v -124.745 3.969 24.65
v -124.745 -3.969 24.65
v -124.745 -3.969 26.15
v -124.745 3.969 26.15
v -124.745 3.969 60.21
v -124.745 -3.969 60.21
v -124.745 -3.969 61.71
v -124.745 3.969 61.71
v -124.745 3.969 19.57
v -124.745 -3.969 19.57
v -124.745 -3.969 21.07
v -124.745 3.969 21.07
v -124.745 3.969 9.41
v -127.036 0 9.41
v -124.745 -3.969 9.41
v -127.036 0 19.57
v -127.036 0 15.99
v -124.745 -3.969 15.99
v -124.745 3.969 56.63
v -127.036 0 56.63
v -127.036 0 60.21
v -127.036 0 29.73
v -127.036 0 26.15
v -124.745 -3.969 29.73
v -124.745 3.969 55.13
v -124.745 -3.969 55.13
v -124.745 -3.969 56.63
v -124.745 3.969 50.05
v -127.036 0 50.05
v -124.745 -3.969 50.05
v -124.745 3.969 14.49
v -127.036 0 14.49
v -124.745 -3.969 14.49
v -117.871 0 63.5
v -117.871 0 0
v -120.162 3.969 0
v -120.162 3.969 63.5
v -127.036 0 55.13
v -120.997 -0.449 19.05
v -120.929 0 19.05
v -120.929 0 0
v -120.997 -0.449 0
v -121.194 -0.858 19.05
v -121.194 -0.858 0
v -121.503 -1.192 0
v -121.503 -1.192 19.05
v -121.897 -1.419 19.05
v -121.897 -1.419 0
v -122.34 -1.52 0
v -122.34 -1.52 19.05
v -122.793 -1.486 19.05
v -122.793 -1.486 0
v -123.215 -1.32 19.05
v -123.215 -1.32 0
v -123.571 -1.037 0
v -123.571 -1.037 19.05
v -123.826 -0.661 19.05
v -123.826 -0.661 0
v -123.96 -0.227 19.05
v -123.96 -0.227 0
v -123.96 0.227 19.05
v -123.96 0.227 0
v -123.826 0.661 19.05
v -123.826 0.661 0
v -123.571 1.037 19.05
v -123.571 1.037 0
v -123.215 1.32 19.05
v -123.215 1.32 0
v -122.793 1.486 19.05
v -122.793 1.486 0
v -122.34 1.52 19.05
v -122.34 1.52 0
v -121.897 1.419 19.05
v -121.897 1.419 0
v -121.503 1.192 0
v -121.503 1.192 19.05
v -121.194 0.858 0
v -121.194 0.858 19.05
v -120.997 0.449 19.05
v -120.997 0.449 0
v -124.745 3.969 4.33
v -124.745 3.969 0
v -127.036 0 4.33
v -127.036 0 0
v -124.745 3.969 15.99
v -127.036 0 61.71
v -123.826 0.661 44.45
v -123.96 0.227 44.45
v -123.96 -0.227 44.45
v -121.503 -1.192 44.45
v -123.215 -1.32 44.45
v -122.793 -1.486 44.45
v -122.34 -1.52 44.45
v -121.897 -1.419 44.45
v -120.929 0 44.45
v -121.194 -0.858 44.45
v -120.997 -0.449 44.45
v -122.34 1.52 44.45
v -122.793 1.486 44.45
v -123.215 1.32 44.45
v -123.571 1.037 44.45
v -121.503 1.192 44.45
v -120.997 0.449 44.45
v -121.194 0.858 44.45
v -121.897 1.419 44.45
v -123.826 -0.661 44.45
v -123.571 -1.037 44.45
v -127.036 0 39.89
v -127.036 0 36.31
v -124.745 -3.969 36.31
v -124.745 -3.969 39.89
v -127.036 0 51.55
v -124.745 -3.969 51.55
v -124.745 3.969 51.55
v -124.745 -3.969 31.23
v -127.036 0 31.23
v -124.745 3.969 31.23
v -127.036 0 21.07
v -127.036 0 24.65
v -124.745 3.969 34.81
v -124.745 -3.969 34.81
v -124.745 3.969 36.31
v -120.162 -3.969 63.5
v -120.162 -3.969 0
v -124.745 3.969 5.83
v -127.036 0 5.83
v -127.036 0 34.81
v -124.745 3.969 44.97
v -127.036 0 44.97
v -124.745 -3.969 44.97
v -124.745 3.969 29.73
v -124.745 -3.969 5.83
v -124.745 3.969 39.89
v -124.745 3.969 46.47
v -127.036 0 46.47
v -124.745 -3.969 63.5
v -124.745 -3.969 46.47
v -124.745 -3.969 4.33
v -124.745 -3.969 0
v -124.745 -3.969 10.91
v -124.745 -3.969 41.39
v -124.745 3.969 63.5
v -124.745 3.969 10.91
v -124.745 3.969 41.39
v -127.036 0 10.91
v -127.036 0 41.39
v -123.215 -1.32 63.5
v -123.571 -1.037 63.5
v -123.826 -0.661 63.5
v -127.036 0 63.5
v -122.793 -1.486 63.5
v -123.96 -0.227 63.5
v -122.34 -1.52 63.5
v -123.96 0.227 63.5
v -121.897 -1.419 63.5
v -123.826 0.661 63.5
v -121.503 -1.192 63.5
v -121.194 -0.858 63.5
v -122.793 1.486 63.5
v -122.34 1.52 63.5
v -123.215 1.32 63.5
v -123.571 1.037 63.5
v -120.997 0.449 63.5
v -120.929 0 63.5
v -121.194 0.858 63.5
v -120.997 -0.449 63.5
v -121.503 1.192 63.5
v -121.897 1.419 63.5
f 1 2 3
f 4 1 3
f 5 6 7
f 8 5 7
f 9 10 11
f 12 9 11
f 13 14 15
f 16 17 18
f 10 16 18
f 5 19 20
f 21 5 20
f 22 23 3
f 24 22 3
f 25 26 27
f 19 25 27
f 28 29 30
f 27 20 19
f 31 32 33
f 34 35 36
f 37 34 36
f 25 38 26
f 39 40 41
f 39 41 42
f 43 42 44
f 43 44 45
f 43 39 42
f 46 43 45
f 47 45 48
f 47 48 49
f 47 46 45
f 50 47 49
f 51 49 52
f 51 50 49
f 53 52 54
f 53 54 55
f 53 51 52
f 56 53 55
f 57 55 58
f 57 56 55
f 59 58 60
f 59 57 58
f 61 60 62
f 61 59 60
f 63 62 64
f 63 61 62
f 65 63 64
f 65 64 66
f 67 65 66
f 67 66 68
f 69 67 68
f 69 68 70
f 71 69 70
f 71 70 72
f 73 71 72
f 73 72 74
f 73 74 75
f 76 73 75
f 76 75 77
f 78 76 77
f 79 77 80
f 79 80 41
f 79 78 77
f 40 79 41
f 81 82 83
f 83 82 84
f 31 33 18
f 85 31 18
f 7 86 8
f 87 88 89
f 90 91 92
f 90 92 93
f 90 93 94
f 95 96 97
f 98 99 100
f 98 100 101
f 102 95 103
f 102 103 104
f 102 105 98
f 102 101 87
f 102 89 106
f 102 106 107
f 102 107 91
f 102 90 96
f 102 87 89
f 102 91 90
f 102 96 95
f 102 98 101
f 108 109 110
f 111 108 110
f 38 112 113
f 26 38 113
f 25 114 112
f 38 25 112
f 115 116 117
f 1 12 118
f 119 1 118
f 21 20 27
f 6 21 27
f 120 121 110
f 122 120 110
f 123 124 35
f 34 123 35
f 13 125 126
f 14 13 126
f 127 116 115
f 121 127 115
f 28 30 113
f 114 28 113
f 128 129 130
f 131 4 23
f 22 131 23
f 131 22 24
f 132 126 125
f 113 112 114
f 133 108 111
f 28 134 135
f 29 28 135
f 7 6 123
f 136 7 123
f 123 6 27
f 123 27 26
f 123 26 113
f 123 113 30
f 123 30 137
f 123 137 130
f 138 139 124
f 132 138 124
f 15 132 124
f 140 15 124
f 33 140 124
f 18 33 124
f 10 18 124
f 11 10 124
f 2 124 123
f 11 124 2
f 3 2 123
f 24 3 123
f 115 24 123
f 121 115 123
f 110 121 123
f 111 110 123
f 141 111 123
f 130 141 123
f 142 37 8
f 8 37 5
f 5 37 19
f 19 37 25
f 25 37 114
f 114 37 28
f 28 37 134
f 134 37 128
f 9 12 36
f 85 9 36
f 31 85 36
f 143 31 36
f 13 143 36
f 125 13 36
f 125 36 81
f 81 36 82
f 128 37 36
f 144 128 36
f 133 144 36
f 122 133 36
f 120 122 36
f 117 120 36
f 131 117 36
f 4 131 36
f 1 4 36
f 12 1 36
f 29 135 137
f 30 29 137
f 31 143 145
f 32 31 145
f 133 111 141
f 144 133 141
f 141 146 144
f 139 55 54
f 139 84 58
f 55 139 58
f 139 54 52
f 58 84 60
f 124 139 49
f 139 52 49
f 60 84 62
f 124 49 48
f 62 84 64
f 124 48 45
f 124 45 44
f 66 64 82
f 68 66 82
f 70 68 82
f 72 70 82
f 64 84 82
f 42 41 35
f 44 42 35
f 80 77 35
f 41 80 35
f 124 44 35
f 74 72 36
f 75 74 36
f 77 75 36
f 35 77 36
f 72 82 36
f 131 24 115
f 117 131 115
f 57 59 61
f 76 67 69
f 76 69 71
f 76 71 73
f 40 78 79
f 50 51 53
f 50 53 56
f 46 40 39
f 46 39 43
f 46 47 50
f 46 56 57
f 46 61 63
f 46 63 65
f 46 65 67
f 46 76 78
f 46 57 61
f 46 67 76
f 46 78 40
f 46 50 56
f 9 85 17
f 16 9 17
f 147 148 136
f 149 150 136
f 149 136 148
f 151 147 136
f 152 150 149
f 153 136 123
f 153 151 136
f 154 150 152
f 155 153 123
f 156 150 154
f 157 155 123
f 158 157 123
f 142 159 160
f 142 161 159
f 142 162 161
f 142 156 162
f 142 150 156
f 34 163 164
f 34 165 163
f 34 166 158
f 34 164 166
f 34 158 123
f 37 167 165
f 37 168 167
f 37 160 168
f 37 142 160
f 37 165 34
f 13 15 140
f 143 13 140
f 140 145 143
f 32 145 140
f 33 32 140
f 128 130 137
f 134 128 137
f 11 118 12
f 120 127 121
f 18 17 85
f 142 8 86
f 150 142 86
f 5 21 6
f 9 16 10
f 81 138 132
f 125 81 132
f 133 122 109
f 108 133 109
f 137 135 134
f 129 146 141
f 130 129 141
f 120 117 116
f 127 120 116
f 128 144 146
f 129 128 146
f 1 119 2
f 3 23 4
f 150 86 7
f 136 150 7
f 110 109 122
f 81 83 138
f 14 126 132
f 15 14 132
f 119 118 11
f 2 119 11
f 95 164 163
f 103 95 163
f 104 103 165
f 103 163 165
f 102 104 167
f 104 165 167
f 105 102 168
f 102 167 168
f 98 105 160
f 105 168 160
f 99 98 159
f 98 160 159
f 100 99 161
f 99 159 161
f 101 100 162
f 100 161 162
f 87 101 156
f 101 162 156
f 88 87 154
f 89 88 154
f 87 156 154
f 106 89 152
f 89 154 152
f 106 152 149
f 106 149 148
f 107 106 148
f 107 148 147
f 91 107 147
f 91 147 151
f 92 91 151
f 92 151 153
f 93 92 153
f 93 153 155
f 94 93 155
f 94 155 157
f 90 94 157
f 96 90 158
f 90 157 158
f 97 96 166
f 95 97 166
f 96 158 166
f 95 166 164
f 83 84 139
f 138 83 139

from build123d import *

# Parameters (mm, degrees)
BOSS_EXTRUDE1_DEPTH = 63.5
SKETCH2_R           = 1.524
CUT_EXTRUDE1_DEPTH  = 19.05
CUT_EXTRUDE2_START  = -19.05
SKETCH3_R           = 1.524
CUT_EXTRUDE2_DEPTH  = 19.05
SKETCH6_W           = 2.291358881
SKETCH6_H           = 1.5
CUT_EXTRUDE4_DEPTH  = 19.05


with BuildPart() as part:
    # Sketch1 → Boss-Extrude1 (new body)
    with BuildSketch(Plane.XY):
        Polygon((-117.870682238, 0), (-120.162041119, 3.96875), (-124.744758881, 3.96875), (-127.036117762, 0), (-124.744758881, -3.96875), (-120.162041119, -3.96875), align=None)
    extrude(amount=BOSS_EXTRUDE1_DEPTH)

    # Sketch2 → Cut-Extrude1 (cut)
    with BuildSketch(Plane.XY.offset(63.5)):
        with Locations((-122.4534, 0)):
            Circle(SKETCH2_R)
    extrude(amount=-CUT_EXTRUDE1_DEPTH, mode=Mode.SUBTRACT)

    # Sketch3 → Cut-Extrude2 (cut)
    with BuildSketch(Plane(origin=(0, 0, 0), x_dir=(-1, 0, 0), z_dir=(0, 0, -1)).offset(CUT_EXTRUDE2_START)):
        with Locations(Location((122.4534, 0, 0), (0, 0, 180))):
            Circle(SKETCH3_R)
    extrude(amount=CUT_EXTRUDE2_DEPTH, mode=Mode.SUBTRACT)

    # Sketch6 → Cut-Extrude4 (cut)
    with BuildSketch(Plane.XZ.offset(3.96875)):
        with Locations((-125.890438321, 5.08)):
            Rectangle(SKETCH6_W, SKETCH6_H)
        with Locations((-125.890438321, 10.16)):
            Rectangle(SKETCH6_W, SKETCH6_H)
        with Locations((-125.890438321, 15.24)):
            Rectangle(SKETCH6_W, SKETCH6_H)
        with Locations((-125.890438321, 20.32)):
            Rectangle(SKETCH6_W, SKETCH6_H)
        with Locations((-125.890438321, 25.4)):
            Rectangle(SKETCH6_W, SKETCH6_H)
        with Locations((-125.890438321, 30.48)):
            Rectangle(SKETCH6_W, SKETCH6_H)
        with Locations((-125.890438321, 35.56)):
            Rectangle(SKETCH6_W, SKETCH6_H)
        with Locations((-125.890438321, 40.64)):
            Rectangle(SKETCH6_W, SKETCH6_H)
        with Locations((-125.890438321, 45.72)):
            Rectangle(SKETCH6_W, SKETCH6_H)
        with Locations((-125.890438321, 50.8)):
            Rectangle(SKETCH6_W, SKETCH6_H)
        with Locations((-125.890438321, 55.88)):
            Rectangle(SKETCH6_W, SKETCH6_H)
        with Locations((-125.890438321, 60.96)):
            Rectangle(SKETCH6_W, SKETCH6_H)
        with Locations((-125.890438321, 66.04)):
            Rectangle(SKETCH6_W, SKETCH6_H)
        with Locations((-125.890438321, 71.12)):
            Rectangle(SKETCH6_W, SKETCH6_H)
    extrude(amount=-CUT_EXTRUDE4_DEPTH, mode=Mode.SUBTRACT)


solid = part.part
